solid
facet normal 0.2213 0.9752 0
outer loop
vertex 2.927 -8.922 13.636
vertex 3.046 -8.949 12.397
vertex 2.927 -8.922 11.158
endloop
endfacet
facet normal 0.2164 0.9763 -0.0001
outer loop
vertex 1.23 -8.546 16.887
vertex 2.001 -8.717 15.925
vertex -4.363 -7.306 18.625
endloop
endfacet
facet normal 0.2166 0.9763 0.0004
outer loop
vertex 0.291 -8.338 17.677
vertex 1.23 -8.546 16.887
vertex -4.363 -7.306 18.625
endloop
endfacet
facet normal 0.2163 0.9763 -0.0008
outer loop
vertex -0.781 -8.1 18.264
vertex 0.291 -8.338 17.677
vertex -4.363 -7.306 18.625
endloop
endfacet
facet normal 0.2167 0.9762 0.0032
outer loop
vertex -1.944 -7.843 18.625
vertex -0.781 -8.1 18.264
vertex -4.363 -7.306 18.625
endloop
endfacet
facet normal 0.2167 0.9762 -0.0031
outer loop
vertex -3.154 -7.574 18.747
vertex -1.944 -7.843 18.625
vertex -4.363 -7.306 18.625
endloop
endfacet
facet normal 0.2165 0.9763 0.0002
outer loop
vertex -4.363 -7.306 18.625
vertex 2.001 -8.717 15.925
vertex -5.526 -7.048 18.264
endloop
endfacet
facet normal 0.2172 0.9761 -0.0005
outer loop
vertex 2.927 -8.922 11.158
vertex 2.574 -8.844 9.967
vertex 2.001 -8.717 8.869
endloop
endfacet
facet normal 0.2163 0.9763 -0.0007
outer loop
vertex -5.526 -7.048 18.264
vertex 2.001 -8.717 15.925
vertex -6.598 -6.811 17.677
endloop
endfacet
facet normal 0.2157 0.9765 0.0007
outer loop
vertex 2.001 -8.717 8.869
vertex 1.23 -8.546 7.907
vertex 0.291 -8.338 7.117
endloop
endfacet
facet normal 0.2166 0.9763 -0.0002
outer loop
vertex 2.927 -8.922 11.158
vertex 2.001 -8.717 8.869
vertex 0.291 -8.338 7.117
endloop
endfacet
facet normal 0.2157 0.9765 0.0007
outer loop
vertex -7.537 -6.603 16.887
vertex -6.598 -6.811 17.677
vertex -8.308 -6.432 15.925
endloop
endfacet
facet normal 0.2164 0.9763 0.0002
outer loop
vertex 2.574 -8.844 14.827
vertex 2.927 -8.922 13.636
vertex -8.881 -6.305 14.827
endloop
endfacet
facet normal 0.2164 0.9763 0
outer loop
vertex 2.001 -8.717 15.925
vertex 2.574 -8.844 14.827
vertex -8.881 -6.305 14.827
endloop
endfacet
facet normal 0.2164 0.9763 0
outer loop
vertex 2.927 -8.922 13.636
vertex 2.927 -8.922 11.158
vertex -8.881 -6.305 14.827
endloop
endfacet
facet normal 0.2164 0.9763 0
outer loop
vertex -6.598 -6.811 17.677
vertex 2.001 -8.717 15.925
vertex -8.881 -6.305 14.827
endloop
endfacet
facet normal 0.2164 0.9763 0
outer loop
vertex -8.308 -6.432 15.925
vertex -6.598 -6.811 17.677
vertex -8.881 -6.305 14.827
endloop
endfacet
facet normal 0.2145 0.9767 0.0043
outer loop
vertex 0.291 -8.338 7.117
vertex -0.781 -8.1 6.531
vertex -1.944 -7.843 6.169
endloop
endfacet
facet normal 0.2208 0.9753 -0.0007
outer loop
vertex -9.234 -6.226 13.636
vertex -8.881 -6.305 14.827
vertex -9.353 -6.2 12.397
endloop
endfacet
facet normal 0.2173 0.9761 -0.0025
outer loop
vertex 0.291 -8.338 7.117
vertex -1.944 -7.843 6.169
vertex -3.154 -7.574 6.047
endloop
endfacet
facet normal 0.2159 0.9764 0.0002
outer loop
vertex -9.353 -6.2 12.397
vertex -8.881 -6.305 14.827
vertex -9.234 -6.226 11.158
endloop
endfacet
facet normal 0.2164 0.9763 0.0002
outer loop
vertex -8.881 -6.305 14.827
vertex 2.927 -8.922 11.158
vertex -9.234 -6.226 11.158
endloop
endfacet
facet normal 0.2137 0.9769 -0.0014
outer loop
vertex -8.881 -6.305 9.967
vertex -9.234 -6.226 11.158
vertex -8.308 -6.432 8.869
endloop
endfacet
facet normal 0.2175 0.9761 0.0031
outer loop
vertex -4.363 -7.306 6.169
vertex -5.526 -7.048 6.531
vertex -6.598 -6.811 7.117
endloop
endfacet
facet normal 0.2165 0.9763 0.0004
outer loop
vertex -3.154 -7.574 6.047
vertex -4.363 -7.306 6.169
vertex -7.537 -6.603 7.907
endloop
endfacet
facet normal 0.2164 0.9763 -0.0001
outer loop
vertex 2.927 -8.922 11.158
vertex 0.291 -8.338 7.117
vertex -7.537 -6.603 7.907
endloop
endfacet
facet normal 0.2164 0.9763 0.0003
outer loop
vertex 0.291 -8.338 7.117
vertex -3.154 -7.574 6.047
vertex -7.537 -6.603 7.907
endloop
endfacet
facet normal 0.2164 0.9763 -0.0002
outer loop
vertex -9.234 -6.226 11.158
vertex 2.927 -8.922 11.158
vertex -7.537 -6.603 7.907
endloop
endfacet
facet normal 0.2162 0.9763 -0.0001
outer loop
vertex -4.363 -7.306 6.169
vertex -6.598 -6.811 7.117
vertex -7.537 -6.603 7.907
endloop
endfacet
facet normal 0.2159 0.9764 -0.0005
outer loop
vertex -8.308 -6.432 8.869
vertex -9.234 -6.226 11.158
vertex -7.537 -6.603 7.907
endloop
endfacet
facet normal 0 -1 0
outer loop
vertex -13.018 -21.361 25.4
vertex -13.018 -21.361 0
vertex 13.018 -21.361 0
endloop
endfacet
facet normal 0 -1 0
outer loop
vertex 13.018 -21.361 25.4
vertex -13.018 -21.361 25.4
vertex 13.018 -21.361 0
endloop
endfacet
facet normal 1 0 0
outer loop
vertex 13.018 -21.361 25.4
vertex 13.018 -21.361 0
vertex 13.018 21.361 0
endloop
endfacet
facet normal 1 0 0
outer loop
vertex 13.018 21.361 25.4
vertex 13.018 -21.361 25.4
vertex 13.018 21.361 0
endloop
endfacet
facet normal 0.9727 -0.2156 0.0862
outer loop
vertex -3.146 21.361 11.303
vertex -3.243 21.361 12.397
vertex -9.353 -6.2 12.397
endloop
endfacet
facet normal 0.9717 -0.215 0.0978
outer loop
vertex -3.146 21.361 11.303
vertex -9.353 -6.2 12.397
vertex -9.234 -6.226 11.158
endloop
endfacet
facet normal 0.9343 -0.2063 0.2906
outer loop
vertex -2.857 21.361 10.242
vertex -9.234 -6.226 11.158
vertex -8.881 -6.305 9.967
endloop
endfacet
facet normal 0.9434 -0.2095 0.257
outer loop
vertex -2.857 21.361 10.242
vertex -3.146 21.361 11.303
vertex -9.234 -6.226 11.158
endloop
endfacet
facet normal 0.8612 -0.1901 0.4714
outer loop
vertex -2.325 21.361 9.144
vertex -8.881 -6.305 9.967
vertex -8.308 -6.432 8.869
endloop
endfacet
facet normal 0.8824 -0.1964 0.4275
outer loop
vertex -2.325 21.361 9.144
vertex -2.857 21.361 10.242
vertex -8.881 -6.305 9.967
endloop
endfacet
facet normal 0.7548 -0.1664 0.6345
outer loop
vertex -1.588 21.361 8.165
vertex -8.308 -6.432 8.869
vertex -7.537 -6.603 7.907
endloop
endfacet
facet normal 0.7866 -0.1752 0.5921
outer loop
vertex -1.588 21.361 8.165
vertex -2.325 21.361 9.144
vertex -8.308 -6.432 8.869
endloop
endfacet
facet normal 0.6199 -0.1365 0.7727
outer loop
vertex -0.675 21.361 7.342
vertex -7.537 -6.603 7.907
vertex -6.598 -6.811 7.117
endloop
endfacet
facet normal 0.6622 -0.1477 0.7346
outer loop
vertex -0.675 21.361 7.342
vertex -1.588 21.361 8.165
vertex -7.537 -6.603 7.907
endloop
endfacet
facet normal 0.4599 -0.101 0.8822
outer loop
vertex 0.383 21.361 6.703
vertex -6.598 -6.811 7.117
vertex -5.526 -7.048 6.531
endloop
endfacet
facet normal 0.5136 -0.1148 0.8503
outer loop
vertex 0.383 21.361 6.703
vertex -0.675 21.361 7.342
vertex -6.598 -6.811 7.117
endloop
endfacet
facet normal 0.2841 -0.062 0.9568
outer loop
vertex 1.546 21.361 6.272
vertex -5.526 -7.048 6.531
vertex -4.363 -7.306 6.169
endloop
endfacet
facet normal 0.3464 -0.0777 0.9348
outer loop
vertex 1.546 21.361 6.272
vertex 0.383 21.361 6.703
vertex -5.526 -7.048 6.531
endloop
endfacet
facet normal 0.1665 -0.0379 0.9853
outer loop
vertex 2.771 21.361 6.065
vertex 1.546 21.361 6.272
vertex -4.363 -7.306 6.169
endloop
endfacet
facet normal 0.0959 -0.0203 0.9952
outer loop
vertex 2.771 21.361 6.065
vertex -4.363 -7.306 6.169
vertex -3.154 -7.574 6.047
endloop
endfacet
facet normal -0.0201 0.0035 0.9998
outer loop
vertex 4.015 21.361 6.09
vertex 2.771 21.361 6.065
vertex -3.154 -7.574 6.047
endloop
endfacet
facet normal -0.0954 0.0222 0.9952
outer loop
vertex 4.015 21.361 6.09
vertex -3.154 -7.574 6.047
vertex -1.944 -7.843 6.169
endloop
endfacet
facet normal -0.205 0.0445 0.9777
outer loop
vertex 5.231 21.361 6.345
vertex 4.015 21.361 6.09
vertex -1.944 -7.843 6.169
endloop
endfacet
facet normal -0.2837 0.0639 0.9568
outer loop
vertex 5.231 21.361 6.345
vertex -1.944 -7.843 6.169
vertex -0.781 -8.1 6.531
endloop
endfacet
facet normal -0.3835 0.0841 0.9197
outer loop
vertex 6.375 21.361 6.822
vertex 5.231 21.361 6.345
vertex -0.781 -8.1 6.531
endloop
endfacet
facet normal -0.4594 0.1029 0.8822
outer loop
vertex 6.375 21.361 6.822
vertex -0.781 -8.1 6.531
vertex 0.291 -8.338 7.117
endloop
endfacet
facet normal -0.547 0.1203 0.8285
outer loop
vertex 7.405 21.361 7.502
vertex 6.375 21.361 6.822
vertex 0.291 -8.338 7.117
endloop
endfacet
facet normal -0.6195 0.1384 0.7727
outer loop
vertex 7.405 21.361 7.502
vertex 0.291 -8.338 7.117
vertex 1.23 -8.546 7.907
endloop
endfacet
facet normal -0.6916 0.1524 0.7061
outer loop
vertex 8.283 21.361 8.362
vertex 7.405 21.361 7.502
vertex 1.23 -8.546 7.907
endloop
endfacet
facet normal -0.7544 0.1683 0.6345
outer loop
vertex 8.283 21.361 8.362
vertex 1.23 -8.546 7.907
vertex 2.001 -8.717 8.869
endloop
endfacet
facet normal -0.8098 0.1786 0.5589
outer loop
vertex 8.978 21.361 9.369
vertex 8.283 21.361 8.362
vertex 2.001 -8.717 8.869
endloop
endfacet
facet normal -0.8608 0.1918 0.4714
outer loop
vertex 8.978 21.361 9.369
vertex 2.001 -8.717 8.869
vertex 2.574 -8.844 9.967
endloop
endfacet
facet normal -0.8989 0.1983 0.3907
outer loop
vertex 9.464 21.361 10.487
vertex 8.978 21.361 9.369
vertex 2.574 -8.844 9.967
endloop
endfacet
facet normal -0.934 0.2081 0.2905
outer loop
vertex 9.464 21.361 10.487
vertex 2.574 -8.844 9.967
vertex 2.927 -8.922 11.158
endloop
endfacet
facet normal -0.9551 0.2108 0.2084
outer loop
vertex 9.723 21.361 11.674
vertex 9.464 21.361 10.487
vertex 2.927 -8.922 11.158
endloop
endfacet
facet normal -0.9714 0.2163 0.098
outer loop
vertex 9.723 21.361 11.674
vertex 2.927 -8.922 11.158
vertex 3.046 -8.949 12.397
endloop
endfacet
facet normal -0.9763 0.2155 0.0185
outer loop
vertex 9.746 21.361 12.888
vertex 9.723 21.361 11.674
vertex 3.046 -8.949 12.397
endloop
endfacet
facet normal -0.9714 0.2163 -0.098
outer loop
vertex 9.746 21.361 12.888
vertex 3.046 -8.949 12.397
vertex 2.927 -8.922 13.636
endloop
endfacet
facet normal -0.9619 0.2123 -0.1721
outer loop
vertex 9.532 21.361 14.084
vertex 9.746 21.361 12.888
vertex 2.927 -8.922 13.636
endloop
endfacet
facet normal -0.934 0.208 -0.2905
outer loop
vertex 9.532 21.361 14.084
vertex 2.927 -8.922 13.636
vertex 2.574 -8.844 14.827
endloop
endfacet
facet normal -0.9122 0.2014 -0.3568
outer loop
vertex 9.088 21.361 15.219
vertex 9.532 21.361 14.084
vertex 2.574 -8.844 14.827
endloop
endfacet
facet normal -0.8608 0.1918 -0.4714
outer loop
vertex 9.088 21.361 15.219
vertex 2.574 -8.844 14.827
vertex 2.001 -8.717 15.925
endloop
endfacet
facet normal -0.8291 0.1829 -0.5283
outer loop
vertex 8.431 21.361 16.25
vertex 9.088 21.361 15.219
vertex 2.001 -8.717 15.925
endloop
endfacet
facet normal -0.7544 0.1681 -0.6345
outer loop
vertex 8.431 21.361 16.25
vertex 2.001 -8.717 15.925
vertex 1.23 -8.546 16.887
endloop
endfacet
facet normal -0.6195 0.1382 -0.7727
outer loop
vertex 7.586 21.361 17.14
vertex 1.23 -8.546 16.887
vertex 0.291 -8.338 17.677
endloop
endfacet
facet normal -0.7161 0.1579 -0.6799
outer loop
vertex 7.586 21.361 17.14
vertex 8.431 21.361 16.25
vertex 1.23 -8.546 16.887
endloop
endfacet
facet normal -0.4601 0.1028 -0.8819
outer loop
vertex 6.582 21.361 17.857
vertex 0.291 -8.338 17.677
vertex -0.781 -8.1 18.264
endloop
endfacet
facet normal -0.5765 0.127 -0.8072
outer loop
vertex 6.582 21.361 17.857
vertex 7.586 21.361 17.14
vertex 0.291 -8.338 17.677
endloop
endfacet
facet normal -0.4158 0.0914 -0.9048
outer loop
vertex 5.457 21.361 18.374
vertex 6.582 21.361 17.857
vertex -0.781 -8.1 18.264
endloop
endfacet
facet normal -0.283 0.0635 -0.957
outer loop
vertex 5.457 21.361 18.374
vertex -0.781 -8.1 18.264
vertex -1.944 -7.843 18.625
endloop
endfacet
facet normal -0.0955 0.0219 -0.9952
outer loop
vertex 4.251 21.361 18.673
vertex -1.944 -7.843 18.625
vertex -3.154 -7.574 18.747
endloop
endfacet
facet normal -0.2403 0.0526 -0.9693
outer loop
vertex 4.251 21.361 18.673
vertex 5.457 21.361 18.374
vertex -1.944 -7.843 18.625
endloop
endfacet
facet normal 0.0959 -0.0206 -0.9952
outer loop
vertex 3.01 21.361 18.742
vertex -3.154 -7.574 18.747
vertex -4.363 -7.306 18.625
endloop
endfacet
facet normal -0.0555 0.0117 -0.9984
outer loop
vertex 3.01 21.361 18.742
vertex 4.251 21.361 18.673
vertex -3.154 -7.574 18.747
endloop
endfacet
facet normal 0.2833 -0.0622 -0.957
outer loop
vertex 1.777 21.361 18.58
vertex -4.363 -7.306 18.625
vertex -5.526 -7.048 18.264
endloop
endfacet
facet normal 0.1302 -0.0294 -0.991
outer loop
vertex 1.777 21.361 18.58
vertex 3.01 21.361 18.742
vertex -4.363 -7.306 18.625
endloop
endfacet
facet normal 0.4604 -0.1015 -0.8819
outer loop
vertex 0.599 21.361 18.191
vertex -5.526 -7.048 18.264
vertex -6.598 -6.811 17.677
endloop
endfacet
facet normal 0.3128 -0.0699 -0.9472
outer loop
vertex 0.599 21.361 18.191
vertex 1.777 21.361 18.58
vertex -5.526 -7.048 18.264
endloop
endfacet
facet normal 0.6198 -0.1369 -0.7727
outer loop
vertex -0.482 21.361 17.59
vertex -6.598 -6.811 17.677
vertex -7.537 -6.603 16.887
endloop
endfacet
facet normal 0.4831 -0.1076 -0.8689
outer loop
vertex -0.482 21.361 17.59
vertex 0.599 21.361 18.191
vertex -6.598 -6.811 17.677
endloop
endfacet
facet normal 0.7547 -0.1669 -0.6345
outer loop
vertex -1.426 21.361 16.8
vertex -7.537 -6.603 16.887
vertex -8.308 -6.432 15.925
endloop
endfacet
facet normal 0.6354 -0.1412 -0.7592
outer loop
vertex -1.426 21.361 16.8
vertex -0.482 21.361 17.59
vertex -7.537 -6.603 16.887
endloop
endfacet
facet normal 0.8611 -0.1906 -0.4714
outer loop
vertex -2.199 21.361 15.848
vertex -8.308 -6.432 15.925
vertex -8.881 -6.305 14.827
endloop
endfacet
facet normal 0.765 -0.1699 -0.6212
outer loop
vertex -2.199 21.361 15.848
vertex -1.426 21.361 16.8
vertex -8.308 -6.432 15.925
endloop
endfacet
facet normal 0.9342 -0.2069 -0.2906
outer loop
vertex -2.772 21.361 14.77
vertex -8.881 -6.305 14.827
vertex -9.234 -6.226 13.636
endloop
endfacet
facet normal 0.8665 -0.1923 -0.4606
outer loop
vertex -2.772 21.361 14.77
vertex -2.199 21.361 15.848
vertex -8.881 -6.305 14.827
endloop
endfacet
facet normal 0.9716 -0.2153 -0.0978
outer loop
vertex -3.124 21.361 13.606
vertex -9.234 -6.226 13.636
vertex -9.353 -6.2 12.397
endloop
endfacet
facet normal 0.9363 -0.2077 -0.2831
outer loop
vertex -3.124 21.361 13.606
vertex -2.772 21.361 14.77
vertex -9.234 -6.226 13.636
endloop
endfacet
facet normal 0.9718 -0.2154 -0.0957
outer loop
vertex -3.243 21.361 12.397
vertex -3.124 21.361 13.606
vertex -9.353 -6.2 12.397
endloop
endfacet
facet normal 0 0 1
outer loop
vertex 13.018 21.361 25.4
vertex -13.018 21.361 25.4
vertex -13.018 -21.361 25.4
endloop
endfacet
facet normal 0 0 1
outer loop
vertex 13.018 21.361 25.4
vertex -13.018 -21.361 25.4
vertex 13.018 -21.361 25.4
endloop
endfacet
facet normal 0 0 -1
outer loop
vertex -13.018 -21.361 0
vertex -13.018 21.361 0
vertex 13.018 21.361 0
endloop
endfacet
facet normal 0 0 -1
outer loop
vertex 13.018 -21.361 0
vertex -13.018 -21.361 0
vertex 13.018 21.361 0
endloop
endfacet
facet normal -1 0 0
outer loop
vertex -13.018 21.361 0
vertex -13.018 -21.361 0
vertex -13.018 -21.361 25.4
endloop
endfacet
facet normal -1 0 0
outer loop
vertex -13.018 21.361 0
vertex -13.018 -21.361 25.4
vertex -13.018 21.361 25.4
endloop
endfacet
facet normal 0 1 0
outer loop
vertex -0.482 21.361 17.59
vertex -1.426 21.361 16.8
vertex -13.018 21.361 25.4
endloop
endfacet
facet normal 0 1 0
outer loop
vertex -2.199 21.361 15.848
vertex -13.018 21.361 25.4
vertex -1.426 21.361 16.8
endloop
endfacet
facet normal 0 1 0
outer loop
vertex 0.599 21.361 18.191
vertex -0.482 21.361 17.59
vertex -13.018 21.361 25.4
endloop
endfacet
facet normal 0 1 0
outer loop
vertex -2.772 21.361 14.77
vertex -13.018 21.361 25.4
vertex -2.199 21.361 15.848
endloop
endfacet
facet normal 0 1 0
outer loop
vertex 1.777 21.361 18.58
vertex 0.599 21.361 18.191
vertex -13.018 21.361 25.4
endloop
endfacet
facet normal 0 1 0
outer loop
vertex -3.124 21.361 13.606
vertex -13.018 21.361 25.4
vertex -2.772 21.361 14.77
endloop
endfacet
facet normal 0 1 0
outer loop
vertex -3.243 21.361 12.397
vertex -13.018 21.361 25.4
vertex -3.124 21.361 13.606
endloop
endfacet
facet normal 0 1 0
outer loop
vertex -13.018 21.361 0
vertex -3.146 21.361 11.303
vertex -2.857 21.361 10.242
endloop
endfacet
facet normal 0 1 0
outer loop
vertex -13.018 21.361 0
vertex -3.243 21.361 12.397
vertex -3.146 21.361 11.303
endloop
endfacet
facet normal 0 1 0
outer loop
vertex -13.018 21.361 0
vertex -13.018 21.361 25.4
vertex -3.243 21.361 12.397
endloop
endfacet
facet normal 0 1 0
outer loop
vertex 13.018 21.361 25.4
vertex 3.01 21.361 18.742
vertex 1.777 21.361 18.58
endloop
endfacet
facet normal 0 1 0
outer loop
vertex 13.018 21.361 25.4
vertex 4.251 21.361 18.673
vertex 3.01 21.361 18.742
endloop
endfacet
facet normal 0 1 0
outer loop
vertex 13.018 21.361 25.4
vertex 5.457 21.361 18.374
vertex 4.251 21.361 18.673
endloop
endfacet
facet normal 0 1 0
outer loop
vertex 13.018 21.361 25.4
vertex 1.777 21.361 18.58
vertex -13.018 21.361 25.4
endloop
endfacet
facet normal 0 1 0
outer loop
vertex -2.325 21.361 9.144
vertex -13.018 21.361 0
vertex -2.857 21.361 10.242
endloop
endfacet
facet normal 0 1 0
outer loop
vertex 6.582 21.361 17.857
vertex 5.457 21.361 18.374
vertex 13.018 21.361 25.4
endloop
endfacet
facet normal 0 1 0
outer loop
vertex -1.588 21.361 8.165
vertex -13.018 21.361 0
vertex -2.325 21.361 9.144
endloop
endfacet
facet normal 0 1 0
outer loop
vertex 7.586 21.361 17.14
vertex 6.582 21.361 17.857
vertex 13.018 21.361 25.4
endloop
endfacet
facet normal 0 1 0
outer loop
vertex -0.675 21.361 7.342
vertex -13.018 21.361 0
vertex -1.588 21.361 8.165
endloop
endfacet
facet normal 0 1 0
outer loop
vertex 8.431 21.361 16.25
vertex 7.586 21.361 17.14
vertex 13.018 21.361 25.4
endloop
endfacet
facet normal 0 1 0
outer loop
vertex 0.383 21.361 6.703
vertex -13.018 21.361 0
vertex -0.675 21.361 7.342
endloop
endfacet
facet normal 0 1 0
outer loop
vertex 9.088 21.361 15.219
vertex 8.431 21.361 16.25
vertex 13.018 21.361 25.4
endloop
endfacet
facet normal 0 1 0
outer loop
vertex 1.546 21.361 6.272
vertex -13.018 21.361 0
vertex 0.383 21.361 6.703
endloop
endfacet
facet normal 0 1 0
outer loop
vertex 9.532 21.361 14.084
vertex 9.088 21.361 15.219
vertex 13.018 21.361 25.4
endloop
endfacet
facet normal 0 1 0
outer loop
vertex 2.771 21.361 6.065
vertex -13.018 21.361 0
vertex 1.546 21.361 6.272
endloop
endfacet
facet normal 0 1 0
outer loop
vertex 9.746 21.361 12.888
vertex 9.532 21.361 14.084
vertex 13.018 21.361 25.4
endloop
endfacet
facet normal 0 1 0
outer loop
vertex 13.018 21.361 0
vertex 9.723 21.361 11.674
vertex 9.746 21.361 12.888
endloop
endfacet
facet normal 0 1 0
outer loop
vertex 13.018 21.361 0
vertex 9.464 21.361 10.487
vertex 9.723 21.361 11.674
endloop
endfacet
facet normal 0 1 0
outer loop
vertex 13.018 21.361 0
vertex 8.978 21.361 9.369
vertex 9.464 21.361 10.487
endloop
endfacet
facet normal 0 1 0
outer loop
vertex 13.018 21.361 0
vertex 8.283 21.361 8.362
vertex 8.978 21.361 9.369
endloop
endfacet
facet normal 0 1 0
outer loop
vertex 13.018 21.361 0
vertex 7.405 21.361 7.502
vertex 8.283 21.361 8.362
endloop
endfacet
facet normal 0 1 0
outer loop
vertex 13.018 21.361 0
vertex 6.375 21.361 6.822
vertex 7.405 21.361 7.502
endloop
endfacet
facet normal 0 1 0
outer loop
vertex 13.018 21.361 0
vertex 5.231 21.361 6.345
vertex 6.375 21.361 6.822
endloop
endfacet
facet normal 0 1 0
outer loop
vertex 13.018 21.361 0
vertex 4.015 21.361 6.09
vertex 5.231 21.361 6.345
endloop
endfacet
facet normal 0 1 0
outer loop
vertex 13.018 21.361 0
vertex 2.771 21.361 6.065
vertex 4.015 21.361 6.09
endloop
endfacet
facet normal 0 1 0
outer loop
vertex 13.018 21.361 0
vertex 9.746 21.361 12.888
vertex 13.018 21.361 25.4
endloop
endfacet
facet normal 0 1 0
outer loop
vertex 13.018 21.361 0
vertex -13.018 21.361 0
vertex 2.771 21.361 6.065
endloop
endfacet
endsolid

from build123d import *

# Parameters (mm, degrees)
SKETCH1_W           = 26.035
SKETCH1_H           = 42.7228
BOSS_EXTRUDE1_DEPTH = 25.4
SKETCH19_R          = 6.35
CUT_EXTRUDE1_DEPTH  = 31.75


with BuildPart() as part:
    # Sketch1 → Boss-Extrude1 (new body)
    with BuildSketch(Plane.XY):
        Rectangle(SKETCH1_W, SKETCH1_H)
    extrude(amount=BOSS_EXTRUDE1_DEPTH)

    # Sketch19 → Cut-Extrude1 (cut)
    with BuildSketch(Plane(origin=(5.123678059, 23.111418192, 0), x_dir=(-0.976296007, 0.216439614, 0), z_dir=(-0.216439614, -0.976296007, 0))):
        with Locations((1.439519896, -12.397187114)):
            Circle(SKETCH19_R)
    extrude(amount=CUT_EXTRUDE1_DEPTH, mode=Mode.SUBTRACT)


solid = part.part
